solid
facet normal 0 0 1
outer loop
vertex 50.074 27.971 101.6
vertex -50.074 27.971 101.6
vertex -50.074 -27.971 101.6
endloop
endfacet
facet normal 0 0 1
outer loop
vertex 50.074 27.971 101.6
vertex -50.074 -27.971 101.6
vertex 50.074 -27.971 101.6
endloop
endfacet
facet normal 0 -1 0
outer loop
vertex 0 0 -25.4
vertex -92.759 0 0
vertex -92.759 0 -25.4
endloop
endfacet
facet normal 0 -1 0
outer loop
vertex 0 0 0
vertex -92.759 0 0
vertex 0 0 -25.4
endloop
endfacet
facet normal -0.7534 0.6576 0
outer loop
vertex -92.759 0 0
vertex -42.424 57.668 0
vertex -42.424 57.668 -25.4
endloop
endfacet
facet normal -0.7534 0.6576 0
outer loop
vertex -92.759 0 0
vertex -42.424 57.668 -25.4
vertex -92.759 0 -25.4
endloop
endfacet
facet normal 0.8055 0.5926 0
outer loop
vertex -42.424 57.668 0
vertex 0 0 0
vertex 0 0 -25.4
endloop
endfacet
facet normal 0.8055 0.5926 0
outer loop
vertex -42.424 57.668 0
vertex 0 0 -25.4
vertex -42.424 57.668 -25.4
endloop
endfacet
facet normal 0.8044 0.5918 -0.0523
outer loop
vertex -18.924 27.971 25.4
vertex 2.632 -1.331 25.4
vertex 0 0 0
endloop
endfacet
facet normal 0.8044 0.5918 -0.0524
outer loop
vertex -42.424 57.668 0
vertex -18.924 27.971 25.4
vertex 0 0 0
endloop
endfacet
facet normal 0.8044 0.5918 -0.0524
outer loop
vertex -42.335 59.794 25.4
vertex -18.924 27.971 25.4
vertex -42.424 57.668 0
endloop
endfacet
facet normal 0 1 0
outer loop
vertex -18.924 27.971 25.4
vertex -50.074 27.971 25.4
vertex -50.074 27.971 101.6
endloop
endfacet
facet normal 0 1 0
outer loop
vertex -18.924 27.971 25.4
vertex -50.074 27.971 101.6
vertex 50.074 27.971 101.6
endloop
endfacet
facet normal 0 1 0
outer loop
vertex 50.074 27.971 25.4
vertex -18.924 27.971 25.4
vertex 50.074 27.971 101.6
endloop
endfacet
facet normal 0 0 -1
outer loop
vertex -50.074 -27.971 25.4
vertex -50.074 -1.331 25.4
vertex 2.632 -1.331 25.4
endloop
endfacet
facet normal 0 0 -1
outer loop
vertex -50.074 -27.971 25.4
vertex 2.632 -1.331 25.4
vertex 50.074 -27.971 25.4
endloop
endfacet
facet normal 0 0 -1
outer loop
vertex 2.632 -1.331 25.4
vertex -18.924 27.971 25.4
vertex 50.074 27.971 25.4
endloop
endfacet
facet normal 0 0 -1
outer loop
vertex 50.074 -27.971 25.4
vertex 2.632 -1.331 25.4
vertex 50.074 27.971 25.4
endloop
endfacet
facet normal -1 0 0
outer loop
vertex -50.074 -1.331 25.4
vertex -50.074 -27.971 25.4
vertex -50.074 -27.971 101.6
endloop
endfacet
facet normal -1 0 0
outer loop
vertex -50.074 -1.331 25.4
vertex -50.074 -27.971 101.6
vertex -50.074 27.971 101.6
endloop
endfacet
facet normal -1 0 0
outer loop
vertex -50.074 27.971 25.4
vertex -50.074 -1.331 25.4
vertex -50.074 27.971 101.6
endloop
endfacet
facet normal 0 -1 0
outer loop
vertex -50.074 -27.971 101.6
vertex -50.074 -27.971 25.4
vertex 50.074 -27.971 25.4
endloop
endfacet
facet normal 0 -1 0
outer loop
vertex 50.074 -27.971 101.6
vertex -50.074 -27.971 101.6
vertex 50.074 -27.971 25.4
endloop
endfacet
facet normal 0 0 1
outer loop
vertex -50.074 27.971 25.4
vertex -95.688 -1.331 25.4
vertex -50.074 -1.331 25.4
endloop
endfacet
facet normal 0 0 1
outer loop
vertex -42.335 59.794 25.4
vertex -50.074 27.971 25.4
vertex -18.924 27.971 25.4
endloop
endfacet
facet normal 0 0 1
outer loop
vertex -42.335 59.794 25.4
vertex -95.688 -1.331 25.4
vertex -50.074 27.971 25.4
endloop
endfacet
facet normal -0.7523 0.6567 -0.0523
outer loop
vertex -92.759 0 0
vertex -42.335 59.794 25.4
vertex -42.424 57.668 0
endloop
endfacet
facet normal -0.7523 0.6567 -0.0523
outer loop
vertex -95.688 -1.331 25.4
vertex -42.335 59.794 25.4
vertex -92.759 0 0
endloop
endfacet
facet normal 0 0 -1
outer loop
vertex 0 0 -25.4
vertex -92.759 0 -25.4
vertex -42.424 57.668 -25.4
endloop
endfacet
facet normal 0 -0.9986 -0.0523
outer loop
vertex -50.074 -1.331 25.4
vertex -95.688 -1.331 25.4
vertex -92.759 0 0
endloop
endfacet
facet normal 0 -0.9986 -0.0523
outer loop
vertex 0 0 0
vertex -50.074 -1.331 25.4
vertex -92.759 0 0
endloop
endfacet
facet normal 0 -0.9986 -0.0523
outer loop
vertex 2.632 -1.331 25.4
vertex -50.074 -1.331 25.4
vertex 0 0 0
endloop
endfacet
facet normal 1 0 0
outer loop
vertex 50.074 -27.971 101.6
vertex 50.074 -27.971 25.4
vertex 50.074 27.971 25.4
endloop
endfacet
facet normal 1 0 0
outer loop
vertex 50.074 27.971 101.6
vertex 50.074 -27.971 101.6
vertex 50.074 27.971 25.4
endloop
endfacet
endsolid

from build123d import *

# Parameters (mm, degrees)
F1_DEPTH      = 25.4
F1_TAPER      = -3
F1_DEPTH_BACK = 25.4
F2_W          = 100.148499012
F2_H          = 55.9419505298
F3_DEPTH      = 76.2


with BuildPart() as f1:
    # F0 (on Top) → F1 (new body, two sides)
    with BuildSketch(Plane.XY) as f1_sk:
        Polygon((-92.7592143416, 0), (0, 0), (-42.4239225686, 57.6683394611), align=None)
    extrude(amount=F1_DEPTH, taper=F1_TAPER)
    extrude(f1_sk.sketch, amount=-F1_DEPTH_BACK)

    # F2 (on face) → F3 (join)
    with BuildSketch(Plane.XY.offset(25.4)):
        Rectangle(F2_W, F2_H)
    extrude(amount=F3_DEPTH)


solid = f1.part
